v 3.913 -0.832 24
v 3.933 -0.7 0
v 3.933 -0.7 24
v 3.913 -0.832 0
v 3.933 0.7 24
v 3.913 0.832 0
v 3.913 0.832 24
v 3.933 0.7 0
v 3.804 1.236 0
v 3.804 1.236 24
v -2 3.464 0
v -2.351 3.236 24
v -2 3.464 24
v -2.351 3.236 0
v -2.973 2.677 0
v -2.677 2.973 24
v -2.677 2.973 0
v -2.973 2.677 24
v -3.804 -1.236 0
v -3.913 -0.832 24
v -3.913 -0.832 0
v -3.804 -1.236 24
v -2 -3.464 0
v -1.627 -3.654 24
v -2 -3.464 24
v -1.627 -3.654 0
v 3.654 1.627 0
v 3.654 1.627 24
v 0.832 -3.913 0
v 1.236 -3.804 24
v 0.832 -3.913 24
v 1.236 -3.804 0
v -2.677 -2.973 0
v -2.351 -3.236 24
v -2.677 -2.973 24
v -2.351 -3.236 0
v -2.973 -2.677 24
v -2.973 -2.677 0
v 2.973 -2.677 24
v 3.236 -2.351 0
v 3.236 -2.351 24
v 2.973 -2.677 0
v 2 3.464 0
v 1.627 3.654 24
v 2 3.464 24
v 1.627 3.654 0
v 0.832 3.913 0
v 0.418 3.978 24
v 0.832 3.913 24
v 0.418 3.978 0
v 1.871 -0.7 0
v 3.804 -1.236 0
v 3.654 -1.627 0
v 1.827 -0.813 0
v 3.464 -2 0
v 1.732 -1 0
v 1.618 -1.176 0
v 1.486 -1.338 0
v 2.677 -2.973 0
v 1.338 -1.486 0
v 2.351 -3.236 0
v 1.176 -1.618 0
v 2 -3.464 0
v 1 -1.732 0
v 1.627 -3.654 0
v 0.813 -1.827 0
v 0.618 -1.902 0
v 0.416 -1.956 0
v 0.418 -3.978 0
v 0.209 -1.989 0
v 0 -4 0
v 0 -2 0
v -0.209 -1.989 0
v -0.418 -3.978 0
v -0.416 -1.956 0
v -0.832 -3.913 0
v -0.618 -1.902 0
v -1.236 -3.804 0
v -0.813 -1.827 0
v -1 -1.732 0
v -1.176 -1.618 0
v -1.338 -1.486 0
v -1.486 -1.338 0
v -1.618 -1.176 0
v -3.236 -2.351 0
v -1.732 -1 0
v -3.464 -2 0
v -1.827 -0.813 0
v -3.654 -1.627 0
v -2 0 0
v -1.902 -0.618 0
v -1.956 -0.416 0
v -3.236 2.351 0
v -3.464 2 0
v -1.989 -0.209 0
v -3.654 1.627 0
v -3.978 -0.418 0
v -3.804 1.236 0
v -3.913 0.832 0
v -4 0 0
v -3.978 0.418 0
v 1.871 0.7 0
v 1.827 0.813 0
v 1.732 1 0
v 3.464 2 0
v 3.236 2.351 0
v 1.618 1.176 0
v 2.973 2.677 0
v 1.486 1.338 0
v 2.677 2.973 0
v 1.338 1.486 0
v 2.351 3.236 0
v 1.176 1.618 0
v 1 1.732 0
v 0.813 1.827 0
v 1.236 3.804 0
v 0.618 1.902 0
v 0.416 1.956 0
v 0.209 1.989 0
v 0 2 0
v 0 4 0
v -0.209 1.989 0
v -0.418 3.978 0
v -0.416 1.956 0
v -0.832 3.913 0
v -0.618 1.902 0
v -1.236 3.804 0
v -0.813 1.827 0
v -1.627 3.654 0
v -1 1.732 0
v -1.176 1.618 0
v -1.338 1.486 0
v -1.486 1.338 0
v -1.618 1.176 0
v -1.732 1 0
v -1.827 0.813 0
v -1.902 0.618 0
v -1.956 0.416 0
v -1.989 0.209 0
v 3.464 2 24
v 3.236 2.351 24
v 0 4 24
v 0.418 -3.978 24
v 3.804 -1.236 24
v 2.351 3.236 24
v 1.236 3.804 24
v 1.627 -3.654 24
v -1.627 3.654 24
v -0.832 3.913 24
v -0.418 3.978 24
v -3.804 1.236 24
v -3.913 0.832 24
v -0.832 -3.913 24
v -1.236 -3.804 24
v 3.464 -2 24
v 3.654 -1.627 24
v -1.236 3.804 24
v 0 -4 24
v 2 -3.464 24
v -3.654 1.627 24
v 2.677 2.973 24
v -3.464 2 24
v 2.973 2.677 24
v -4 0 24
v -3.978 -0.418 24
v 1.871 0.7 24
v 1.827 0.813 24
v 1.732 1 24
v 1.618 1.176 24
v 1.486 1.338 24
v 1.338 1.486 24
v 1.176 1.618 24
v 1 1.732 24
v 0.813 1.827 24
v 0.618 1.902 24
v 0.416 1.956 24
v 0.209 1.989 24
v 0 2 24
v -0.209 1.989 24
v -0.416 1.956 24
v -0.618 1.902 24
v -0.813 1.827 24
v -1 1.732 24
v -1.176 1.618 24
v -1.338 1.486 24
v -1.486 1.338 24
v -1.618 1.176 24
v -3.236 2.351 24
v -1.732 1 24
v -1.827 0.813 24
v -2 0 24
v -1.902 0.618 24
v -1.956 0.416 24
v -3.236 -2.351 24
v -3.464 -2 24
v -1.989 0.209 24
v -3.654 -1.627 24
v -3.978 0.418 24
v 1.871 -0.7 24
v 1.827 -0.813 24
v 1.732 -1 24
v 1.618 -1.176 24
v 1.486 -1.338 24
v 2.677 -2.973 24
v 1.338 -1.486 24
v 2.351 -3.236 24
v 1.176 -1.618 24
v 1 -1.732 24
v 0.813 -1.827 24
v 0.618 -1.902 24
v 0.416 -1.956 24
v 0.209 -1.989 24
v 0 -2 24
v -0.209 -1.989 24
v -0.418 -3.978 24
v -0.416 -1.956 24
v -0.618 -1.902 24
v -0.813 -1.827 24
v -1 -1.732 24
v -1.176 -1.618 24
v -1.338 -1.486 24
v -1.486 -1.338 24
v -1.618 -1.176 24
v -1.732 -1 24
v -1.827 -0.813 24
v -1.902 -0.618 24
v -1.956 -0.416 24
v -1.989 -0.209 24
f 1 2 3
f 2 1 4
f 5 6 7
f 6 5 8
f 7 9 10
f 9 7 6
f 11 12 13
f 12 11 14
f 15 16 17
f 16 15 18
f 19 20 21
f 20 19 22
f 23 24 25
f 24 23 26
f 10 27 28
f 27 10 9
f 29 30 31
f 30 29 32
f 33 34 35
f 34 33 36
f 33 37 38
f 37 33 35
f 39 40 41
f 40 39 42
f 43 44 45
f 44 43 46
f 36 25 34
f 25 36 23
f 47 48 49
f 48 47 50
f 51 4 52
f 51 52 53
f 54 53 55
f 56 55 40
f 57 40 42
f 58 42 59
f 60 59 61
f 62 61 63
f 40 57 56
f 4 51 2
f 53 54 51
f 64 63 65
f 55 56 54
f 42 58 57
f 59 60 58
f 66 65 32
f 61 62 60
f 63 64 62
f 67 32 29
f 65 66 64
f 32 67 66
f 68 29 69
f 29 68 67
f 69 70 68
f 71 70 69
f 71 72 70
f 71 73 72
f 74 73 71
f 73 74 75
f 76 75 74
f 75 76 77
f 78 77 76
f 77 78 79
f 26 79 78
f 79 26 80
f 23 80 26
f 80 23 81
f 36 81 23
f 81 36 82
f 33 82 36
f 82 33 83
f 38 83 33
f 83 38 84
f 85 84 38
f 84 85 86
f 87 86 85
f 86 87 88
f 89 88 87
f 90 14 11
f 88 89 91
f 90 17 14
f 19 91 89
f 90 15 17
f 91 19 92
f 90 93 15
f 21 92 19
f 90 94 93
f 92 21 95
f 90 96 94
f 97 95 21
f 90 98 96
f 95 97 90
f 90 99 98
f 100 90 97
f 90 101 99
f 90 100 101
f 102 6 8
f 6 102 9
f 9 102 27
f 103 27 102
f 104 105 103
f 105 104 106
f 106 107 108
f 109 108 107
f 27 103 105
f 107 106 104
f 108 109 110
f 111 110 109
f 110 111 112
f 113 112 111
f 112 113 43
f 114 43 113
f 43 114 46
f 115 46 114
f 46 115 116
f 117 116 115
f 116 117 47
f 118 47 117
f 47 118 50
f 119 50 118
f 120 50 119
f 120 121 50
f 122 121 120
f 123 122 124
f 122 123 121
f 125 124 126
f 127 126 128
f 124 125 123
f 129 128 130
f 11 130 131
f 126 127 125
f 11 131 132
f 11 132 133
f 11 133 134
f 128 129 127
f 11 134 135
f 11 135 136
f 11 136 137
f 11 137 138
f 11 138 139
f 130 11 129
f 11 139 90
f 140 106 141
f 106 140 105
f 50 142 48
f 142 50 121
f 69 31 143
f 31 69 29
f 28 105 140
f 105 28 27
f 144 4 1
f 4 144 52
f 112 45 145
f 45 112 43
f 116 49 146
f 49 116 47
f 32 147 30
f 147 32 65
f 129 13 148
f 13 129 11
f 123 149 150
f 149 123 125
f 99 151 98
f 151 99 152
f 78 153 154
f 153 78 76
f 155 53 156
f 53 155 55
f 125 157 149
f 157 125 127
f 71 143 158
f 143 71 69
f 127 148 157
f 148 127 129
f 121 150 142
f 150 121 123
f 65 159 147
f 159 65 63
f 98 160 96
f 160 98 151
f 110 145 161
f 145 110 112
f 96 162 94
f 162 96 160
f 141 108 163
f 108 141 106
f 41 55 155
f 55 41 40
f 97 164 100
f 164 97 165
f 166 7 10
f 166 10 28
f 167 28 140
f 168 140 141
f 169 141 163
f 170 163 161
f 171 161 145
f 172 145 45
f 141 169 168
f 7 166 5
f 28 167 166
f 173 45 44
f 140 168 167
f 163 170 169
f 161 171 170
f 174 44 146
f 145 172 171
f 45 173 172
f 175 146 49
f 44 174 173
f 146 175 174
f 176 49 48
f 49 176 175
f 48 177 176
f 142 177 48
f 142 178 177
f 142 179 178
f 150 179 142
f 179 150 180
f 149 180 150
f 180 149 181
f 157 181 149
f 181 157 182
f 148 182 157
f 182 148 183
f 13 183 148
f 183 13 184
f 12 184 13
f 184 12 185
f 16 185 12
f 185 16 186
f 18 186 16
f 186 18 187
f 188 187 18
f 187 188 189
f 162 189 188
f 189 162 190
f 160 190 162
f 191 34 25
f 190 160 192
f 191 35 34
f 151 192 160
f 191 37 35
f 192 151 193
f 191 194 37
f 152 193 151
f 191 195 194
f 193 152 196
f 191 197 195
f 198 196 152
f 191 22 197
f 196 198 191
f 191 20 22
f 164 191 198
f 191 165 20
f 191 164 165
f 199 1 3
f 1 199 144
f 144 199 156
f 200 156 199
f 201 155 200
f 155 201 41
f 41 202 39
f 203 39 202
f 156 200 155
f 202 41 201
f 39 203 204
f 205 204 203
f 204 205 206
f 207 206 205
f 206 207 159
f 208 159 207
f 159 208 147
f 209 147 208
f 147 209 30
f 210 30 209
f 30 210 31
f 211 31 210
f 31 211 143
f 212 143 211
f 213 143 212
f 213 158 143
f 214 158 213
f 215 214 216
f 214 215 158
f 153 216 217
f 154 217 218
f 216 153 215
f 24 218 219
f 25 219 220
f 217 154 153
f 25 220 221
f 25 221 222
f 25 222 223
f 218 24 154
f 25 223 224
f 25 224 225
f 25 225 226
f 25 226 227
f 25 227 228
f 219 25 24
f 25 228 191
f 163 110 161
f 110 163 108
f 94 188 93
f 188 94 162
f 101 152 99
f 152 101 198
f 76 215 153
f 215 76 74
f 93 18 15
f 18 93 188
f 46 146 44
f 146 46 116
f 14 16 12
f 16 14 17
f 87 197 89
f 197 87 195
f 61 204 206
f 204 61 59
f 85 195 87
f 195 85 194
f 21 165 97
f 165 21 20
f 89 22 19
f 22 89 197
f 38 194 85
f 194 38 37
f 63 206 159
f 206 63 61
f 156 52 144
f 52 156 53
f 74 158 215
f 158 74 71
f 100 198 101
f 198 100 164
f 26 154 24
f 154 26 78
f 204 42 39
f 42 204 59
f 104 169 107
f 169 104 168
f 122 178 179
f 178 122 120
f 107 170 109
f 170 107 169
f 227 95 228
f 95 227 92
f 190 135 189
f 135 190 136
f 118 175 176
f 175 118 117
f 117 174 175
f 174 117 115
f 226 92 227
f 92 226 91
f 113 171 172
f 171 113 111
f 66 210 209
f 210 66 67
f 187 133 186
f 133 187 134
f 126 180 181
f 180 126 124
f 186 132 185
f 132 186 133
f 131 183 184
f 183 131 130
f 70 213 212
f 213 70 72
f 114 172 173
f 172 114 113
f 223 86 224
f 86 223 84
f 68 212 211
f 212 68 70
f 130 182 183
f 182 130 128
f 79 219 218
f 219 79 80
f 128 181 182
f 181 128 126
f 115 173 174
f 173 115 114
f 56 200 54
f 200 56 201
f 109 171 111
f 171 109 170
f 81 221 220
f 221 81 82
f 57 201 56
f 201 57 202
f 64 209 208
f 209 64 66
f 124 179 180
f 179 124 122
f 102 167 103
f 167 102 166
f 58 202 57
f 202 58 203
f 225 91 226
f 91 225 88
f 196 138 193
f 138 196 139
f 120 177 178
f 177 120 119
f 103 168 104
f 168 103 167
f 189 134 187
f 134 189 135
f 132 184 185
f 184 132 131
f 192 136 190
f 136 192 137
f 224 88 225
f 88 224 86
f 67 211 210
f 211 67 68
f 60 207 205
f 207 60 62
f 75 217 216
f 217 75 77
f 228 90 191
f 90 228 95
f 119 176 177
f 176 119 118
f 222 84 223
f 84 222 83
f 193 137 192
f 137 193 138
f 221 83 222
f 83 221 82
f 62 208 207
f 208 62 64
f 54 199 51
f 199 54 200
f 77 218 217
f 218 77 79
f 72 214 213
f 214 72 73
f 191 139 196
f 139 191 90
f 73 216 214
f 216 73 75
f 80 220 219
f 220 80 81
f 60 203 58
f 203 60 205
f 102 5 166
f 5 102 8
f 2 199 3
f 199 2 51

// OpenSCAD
// Slotted roll pin.
$fn = 60;
eps = 0.02;
inner_d = 4;
outer_d = 8;
length = 24;
slot = 1.4;
difference() {
    cylinder(d=outer_d,h=length);
    translate([0,0,-eps]) cylinder(d=inner_d,h=length+2*eps);
    translate([0,-slot/2,-eps]) cube([outer_d/2+eps,slot,length+2*eps]);
}
